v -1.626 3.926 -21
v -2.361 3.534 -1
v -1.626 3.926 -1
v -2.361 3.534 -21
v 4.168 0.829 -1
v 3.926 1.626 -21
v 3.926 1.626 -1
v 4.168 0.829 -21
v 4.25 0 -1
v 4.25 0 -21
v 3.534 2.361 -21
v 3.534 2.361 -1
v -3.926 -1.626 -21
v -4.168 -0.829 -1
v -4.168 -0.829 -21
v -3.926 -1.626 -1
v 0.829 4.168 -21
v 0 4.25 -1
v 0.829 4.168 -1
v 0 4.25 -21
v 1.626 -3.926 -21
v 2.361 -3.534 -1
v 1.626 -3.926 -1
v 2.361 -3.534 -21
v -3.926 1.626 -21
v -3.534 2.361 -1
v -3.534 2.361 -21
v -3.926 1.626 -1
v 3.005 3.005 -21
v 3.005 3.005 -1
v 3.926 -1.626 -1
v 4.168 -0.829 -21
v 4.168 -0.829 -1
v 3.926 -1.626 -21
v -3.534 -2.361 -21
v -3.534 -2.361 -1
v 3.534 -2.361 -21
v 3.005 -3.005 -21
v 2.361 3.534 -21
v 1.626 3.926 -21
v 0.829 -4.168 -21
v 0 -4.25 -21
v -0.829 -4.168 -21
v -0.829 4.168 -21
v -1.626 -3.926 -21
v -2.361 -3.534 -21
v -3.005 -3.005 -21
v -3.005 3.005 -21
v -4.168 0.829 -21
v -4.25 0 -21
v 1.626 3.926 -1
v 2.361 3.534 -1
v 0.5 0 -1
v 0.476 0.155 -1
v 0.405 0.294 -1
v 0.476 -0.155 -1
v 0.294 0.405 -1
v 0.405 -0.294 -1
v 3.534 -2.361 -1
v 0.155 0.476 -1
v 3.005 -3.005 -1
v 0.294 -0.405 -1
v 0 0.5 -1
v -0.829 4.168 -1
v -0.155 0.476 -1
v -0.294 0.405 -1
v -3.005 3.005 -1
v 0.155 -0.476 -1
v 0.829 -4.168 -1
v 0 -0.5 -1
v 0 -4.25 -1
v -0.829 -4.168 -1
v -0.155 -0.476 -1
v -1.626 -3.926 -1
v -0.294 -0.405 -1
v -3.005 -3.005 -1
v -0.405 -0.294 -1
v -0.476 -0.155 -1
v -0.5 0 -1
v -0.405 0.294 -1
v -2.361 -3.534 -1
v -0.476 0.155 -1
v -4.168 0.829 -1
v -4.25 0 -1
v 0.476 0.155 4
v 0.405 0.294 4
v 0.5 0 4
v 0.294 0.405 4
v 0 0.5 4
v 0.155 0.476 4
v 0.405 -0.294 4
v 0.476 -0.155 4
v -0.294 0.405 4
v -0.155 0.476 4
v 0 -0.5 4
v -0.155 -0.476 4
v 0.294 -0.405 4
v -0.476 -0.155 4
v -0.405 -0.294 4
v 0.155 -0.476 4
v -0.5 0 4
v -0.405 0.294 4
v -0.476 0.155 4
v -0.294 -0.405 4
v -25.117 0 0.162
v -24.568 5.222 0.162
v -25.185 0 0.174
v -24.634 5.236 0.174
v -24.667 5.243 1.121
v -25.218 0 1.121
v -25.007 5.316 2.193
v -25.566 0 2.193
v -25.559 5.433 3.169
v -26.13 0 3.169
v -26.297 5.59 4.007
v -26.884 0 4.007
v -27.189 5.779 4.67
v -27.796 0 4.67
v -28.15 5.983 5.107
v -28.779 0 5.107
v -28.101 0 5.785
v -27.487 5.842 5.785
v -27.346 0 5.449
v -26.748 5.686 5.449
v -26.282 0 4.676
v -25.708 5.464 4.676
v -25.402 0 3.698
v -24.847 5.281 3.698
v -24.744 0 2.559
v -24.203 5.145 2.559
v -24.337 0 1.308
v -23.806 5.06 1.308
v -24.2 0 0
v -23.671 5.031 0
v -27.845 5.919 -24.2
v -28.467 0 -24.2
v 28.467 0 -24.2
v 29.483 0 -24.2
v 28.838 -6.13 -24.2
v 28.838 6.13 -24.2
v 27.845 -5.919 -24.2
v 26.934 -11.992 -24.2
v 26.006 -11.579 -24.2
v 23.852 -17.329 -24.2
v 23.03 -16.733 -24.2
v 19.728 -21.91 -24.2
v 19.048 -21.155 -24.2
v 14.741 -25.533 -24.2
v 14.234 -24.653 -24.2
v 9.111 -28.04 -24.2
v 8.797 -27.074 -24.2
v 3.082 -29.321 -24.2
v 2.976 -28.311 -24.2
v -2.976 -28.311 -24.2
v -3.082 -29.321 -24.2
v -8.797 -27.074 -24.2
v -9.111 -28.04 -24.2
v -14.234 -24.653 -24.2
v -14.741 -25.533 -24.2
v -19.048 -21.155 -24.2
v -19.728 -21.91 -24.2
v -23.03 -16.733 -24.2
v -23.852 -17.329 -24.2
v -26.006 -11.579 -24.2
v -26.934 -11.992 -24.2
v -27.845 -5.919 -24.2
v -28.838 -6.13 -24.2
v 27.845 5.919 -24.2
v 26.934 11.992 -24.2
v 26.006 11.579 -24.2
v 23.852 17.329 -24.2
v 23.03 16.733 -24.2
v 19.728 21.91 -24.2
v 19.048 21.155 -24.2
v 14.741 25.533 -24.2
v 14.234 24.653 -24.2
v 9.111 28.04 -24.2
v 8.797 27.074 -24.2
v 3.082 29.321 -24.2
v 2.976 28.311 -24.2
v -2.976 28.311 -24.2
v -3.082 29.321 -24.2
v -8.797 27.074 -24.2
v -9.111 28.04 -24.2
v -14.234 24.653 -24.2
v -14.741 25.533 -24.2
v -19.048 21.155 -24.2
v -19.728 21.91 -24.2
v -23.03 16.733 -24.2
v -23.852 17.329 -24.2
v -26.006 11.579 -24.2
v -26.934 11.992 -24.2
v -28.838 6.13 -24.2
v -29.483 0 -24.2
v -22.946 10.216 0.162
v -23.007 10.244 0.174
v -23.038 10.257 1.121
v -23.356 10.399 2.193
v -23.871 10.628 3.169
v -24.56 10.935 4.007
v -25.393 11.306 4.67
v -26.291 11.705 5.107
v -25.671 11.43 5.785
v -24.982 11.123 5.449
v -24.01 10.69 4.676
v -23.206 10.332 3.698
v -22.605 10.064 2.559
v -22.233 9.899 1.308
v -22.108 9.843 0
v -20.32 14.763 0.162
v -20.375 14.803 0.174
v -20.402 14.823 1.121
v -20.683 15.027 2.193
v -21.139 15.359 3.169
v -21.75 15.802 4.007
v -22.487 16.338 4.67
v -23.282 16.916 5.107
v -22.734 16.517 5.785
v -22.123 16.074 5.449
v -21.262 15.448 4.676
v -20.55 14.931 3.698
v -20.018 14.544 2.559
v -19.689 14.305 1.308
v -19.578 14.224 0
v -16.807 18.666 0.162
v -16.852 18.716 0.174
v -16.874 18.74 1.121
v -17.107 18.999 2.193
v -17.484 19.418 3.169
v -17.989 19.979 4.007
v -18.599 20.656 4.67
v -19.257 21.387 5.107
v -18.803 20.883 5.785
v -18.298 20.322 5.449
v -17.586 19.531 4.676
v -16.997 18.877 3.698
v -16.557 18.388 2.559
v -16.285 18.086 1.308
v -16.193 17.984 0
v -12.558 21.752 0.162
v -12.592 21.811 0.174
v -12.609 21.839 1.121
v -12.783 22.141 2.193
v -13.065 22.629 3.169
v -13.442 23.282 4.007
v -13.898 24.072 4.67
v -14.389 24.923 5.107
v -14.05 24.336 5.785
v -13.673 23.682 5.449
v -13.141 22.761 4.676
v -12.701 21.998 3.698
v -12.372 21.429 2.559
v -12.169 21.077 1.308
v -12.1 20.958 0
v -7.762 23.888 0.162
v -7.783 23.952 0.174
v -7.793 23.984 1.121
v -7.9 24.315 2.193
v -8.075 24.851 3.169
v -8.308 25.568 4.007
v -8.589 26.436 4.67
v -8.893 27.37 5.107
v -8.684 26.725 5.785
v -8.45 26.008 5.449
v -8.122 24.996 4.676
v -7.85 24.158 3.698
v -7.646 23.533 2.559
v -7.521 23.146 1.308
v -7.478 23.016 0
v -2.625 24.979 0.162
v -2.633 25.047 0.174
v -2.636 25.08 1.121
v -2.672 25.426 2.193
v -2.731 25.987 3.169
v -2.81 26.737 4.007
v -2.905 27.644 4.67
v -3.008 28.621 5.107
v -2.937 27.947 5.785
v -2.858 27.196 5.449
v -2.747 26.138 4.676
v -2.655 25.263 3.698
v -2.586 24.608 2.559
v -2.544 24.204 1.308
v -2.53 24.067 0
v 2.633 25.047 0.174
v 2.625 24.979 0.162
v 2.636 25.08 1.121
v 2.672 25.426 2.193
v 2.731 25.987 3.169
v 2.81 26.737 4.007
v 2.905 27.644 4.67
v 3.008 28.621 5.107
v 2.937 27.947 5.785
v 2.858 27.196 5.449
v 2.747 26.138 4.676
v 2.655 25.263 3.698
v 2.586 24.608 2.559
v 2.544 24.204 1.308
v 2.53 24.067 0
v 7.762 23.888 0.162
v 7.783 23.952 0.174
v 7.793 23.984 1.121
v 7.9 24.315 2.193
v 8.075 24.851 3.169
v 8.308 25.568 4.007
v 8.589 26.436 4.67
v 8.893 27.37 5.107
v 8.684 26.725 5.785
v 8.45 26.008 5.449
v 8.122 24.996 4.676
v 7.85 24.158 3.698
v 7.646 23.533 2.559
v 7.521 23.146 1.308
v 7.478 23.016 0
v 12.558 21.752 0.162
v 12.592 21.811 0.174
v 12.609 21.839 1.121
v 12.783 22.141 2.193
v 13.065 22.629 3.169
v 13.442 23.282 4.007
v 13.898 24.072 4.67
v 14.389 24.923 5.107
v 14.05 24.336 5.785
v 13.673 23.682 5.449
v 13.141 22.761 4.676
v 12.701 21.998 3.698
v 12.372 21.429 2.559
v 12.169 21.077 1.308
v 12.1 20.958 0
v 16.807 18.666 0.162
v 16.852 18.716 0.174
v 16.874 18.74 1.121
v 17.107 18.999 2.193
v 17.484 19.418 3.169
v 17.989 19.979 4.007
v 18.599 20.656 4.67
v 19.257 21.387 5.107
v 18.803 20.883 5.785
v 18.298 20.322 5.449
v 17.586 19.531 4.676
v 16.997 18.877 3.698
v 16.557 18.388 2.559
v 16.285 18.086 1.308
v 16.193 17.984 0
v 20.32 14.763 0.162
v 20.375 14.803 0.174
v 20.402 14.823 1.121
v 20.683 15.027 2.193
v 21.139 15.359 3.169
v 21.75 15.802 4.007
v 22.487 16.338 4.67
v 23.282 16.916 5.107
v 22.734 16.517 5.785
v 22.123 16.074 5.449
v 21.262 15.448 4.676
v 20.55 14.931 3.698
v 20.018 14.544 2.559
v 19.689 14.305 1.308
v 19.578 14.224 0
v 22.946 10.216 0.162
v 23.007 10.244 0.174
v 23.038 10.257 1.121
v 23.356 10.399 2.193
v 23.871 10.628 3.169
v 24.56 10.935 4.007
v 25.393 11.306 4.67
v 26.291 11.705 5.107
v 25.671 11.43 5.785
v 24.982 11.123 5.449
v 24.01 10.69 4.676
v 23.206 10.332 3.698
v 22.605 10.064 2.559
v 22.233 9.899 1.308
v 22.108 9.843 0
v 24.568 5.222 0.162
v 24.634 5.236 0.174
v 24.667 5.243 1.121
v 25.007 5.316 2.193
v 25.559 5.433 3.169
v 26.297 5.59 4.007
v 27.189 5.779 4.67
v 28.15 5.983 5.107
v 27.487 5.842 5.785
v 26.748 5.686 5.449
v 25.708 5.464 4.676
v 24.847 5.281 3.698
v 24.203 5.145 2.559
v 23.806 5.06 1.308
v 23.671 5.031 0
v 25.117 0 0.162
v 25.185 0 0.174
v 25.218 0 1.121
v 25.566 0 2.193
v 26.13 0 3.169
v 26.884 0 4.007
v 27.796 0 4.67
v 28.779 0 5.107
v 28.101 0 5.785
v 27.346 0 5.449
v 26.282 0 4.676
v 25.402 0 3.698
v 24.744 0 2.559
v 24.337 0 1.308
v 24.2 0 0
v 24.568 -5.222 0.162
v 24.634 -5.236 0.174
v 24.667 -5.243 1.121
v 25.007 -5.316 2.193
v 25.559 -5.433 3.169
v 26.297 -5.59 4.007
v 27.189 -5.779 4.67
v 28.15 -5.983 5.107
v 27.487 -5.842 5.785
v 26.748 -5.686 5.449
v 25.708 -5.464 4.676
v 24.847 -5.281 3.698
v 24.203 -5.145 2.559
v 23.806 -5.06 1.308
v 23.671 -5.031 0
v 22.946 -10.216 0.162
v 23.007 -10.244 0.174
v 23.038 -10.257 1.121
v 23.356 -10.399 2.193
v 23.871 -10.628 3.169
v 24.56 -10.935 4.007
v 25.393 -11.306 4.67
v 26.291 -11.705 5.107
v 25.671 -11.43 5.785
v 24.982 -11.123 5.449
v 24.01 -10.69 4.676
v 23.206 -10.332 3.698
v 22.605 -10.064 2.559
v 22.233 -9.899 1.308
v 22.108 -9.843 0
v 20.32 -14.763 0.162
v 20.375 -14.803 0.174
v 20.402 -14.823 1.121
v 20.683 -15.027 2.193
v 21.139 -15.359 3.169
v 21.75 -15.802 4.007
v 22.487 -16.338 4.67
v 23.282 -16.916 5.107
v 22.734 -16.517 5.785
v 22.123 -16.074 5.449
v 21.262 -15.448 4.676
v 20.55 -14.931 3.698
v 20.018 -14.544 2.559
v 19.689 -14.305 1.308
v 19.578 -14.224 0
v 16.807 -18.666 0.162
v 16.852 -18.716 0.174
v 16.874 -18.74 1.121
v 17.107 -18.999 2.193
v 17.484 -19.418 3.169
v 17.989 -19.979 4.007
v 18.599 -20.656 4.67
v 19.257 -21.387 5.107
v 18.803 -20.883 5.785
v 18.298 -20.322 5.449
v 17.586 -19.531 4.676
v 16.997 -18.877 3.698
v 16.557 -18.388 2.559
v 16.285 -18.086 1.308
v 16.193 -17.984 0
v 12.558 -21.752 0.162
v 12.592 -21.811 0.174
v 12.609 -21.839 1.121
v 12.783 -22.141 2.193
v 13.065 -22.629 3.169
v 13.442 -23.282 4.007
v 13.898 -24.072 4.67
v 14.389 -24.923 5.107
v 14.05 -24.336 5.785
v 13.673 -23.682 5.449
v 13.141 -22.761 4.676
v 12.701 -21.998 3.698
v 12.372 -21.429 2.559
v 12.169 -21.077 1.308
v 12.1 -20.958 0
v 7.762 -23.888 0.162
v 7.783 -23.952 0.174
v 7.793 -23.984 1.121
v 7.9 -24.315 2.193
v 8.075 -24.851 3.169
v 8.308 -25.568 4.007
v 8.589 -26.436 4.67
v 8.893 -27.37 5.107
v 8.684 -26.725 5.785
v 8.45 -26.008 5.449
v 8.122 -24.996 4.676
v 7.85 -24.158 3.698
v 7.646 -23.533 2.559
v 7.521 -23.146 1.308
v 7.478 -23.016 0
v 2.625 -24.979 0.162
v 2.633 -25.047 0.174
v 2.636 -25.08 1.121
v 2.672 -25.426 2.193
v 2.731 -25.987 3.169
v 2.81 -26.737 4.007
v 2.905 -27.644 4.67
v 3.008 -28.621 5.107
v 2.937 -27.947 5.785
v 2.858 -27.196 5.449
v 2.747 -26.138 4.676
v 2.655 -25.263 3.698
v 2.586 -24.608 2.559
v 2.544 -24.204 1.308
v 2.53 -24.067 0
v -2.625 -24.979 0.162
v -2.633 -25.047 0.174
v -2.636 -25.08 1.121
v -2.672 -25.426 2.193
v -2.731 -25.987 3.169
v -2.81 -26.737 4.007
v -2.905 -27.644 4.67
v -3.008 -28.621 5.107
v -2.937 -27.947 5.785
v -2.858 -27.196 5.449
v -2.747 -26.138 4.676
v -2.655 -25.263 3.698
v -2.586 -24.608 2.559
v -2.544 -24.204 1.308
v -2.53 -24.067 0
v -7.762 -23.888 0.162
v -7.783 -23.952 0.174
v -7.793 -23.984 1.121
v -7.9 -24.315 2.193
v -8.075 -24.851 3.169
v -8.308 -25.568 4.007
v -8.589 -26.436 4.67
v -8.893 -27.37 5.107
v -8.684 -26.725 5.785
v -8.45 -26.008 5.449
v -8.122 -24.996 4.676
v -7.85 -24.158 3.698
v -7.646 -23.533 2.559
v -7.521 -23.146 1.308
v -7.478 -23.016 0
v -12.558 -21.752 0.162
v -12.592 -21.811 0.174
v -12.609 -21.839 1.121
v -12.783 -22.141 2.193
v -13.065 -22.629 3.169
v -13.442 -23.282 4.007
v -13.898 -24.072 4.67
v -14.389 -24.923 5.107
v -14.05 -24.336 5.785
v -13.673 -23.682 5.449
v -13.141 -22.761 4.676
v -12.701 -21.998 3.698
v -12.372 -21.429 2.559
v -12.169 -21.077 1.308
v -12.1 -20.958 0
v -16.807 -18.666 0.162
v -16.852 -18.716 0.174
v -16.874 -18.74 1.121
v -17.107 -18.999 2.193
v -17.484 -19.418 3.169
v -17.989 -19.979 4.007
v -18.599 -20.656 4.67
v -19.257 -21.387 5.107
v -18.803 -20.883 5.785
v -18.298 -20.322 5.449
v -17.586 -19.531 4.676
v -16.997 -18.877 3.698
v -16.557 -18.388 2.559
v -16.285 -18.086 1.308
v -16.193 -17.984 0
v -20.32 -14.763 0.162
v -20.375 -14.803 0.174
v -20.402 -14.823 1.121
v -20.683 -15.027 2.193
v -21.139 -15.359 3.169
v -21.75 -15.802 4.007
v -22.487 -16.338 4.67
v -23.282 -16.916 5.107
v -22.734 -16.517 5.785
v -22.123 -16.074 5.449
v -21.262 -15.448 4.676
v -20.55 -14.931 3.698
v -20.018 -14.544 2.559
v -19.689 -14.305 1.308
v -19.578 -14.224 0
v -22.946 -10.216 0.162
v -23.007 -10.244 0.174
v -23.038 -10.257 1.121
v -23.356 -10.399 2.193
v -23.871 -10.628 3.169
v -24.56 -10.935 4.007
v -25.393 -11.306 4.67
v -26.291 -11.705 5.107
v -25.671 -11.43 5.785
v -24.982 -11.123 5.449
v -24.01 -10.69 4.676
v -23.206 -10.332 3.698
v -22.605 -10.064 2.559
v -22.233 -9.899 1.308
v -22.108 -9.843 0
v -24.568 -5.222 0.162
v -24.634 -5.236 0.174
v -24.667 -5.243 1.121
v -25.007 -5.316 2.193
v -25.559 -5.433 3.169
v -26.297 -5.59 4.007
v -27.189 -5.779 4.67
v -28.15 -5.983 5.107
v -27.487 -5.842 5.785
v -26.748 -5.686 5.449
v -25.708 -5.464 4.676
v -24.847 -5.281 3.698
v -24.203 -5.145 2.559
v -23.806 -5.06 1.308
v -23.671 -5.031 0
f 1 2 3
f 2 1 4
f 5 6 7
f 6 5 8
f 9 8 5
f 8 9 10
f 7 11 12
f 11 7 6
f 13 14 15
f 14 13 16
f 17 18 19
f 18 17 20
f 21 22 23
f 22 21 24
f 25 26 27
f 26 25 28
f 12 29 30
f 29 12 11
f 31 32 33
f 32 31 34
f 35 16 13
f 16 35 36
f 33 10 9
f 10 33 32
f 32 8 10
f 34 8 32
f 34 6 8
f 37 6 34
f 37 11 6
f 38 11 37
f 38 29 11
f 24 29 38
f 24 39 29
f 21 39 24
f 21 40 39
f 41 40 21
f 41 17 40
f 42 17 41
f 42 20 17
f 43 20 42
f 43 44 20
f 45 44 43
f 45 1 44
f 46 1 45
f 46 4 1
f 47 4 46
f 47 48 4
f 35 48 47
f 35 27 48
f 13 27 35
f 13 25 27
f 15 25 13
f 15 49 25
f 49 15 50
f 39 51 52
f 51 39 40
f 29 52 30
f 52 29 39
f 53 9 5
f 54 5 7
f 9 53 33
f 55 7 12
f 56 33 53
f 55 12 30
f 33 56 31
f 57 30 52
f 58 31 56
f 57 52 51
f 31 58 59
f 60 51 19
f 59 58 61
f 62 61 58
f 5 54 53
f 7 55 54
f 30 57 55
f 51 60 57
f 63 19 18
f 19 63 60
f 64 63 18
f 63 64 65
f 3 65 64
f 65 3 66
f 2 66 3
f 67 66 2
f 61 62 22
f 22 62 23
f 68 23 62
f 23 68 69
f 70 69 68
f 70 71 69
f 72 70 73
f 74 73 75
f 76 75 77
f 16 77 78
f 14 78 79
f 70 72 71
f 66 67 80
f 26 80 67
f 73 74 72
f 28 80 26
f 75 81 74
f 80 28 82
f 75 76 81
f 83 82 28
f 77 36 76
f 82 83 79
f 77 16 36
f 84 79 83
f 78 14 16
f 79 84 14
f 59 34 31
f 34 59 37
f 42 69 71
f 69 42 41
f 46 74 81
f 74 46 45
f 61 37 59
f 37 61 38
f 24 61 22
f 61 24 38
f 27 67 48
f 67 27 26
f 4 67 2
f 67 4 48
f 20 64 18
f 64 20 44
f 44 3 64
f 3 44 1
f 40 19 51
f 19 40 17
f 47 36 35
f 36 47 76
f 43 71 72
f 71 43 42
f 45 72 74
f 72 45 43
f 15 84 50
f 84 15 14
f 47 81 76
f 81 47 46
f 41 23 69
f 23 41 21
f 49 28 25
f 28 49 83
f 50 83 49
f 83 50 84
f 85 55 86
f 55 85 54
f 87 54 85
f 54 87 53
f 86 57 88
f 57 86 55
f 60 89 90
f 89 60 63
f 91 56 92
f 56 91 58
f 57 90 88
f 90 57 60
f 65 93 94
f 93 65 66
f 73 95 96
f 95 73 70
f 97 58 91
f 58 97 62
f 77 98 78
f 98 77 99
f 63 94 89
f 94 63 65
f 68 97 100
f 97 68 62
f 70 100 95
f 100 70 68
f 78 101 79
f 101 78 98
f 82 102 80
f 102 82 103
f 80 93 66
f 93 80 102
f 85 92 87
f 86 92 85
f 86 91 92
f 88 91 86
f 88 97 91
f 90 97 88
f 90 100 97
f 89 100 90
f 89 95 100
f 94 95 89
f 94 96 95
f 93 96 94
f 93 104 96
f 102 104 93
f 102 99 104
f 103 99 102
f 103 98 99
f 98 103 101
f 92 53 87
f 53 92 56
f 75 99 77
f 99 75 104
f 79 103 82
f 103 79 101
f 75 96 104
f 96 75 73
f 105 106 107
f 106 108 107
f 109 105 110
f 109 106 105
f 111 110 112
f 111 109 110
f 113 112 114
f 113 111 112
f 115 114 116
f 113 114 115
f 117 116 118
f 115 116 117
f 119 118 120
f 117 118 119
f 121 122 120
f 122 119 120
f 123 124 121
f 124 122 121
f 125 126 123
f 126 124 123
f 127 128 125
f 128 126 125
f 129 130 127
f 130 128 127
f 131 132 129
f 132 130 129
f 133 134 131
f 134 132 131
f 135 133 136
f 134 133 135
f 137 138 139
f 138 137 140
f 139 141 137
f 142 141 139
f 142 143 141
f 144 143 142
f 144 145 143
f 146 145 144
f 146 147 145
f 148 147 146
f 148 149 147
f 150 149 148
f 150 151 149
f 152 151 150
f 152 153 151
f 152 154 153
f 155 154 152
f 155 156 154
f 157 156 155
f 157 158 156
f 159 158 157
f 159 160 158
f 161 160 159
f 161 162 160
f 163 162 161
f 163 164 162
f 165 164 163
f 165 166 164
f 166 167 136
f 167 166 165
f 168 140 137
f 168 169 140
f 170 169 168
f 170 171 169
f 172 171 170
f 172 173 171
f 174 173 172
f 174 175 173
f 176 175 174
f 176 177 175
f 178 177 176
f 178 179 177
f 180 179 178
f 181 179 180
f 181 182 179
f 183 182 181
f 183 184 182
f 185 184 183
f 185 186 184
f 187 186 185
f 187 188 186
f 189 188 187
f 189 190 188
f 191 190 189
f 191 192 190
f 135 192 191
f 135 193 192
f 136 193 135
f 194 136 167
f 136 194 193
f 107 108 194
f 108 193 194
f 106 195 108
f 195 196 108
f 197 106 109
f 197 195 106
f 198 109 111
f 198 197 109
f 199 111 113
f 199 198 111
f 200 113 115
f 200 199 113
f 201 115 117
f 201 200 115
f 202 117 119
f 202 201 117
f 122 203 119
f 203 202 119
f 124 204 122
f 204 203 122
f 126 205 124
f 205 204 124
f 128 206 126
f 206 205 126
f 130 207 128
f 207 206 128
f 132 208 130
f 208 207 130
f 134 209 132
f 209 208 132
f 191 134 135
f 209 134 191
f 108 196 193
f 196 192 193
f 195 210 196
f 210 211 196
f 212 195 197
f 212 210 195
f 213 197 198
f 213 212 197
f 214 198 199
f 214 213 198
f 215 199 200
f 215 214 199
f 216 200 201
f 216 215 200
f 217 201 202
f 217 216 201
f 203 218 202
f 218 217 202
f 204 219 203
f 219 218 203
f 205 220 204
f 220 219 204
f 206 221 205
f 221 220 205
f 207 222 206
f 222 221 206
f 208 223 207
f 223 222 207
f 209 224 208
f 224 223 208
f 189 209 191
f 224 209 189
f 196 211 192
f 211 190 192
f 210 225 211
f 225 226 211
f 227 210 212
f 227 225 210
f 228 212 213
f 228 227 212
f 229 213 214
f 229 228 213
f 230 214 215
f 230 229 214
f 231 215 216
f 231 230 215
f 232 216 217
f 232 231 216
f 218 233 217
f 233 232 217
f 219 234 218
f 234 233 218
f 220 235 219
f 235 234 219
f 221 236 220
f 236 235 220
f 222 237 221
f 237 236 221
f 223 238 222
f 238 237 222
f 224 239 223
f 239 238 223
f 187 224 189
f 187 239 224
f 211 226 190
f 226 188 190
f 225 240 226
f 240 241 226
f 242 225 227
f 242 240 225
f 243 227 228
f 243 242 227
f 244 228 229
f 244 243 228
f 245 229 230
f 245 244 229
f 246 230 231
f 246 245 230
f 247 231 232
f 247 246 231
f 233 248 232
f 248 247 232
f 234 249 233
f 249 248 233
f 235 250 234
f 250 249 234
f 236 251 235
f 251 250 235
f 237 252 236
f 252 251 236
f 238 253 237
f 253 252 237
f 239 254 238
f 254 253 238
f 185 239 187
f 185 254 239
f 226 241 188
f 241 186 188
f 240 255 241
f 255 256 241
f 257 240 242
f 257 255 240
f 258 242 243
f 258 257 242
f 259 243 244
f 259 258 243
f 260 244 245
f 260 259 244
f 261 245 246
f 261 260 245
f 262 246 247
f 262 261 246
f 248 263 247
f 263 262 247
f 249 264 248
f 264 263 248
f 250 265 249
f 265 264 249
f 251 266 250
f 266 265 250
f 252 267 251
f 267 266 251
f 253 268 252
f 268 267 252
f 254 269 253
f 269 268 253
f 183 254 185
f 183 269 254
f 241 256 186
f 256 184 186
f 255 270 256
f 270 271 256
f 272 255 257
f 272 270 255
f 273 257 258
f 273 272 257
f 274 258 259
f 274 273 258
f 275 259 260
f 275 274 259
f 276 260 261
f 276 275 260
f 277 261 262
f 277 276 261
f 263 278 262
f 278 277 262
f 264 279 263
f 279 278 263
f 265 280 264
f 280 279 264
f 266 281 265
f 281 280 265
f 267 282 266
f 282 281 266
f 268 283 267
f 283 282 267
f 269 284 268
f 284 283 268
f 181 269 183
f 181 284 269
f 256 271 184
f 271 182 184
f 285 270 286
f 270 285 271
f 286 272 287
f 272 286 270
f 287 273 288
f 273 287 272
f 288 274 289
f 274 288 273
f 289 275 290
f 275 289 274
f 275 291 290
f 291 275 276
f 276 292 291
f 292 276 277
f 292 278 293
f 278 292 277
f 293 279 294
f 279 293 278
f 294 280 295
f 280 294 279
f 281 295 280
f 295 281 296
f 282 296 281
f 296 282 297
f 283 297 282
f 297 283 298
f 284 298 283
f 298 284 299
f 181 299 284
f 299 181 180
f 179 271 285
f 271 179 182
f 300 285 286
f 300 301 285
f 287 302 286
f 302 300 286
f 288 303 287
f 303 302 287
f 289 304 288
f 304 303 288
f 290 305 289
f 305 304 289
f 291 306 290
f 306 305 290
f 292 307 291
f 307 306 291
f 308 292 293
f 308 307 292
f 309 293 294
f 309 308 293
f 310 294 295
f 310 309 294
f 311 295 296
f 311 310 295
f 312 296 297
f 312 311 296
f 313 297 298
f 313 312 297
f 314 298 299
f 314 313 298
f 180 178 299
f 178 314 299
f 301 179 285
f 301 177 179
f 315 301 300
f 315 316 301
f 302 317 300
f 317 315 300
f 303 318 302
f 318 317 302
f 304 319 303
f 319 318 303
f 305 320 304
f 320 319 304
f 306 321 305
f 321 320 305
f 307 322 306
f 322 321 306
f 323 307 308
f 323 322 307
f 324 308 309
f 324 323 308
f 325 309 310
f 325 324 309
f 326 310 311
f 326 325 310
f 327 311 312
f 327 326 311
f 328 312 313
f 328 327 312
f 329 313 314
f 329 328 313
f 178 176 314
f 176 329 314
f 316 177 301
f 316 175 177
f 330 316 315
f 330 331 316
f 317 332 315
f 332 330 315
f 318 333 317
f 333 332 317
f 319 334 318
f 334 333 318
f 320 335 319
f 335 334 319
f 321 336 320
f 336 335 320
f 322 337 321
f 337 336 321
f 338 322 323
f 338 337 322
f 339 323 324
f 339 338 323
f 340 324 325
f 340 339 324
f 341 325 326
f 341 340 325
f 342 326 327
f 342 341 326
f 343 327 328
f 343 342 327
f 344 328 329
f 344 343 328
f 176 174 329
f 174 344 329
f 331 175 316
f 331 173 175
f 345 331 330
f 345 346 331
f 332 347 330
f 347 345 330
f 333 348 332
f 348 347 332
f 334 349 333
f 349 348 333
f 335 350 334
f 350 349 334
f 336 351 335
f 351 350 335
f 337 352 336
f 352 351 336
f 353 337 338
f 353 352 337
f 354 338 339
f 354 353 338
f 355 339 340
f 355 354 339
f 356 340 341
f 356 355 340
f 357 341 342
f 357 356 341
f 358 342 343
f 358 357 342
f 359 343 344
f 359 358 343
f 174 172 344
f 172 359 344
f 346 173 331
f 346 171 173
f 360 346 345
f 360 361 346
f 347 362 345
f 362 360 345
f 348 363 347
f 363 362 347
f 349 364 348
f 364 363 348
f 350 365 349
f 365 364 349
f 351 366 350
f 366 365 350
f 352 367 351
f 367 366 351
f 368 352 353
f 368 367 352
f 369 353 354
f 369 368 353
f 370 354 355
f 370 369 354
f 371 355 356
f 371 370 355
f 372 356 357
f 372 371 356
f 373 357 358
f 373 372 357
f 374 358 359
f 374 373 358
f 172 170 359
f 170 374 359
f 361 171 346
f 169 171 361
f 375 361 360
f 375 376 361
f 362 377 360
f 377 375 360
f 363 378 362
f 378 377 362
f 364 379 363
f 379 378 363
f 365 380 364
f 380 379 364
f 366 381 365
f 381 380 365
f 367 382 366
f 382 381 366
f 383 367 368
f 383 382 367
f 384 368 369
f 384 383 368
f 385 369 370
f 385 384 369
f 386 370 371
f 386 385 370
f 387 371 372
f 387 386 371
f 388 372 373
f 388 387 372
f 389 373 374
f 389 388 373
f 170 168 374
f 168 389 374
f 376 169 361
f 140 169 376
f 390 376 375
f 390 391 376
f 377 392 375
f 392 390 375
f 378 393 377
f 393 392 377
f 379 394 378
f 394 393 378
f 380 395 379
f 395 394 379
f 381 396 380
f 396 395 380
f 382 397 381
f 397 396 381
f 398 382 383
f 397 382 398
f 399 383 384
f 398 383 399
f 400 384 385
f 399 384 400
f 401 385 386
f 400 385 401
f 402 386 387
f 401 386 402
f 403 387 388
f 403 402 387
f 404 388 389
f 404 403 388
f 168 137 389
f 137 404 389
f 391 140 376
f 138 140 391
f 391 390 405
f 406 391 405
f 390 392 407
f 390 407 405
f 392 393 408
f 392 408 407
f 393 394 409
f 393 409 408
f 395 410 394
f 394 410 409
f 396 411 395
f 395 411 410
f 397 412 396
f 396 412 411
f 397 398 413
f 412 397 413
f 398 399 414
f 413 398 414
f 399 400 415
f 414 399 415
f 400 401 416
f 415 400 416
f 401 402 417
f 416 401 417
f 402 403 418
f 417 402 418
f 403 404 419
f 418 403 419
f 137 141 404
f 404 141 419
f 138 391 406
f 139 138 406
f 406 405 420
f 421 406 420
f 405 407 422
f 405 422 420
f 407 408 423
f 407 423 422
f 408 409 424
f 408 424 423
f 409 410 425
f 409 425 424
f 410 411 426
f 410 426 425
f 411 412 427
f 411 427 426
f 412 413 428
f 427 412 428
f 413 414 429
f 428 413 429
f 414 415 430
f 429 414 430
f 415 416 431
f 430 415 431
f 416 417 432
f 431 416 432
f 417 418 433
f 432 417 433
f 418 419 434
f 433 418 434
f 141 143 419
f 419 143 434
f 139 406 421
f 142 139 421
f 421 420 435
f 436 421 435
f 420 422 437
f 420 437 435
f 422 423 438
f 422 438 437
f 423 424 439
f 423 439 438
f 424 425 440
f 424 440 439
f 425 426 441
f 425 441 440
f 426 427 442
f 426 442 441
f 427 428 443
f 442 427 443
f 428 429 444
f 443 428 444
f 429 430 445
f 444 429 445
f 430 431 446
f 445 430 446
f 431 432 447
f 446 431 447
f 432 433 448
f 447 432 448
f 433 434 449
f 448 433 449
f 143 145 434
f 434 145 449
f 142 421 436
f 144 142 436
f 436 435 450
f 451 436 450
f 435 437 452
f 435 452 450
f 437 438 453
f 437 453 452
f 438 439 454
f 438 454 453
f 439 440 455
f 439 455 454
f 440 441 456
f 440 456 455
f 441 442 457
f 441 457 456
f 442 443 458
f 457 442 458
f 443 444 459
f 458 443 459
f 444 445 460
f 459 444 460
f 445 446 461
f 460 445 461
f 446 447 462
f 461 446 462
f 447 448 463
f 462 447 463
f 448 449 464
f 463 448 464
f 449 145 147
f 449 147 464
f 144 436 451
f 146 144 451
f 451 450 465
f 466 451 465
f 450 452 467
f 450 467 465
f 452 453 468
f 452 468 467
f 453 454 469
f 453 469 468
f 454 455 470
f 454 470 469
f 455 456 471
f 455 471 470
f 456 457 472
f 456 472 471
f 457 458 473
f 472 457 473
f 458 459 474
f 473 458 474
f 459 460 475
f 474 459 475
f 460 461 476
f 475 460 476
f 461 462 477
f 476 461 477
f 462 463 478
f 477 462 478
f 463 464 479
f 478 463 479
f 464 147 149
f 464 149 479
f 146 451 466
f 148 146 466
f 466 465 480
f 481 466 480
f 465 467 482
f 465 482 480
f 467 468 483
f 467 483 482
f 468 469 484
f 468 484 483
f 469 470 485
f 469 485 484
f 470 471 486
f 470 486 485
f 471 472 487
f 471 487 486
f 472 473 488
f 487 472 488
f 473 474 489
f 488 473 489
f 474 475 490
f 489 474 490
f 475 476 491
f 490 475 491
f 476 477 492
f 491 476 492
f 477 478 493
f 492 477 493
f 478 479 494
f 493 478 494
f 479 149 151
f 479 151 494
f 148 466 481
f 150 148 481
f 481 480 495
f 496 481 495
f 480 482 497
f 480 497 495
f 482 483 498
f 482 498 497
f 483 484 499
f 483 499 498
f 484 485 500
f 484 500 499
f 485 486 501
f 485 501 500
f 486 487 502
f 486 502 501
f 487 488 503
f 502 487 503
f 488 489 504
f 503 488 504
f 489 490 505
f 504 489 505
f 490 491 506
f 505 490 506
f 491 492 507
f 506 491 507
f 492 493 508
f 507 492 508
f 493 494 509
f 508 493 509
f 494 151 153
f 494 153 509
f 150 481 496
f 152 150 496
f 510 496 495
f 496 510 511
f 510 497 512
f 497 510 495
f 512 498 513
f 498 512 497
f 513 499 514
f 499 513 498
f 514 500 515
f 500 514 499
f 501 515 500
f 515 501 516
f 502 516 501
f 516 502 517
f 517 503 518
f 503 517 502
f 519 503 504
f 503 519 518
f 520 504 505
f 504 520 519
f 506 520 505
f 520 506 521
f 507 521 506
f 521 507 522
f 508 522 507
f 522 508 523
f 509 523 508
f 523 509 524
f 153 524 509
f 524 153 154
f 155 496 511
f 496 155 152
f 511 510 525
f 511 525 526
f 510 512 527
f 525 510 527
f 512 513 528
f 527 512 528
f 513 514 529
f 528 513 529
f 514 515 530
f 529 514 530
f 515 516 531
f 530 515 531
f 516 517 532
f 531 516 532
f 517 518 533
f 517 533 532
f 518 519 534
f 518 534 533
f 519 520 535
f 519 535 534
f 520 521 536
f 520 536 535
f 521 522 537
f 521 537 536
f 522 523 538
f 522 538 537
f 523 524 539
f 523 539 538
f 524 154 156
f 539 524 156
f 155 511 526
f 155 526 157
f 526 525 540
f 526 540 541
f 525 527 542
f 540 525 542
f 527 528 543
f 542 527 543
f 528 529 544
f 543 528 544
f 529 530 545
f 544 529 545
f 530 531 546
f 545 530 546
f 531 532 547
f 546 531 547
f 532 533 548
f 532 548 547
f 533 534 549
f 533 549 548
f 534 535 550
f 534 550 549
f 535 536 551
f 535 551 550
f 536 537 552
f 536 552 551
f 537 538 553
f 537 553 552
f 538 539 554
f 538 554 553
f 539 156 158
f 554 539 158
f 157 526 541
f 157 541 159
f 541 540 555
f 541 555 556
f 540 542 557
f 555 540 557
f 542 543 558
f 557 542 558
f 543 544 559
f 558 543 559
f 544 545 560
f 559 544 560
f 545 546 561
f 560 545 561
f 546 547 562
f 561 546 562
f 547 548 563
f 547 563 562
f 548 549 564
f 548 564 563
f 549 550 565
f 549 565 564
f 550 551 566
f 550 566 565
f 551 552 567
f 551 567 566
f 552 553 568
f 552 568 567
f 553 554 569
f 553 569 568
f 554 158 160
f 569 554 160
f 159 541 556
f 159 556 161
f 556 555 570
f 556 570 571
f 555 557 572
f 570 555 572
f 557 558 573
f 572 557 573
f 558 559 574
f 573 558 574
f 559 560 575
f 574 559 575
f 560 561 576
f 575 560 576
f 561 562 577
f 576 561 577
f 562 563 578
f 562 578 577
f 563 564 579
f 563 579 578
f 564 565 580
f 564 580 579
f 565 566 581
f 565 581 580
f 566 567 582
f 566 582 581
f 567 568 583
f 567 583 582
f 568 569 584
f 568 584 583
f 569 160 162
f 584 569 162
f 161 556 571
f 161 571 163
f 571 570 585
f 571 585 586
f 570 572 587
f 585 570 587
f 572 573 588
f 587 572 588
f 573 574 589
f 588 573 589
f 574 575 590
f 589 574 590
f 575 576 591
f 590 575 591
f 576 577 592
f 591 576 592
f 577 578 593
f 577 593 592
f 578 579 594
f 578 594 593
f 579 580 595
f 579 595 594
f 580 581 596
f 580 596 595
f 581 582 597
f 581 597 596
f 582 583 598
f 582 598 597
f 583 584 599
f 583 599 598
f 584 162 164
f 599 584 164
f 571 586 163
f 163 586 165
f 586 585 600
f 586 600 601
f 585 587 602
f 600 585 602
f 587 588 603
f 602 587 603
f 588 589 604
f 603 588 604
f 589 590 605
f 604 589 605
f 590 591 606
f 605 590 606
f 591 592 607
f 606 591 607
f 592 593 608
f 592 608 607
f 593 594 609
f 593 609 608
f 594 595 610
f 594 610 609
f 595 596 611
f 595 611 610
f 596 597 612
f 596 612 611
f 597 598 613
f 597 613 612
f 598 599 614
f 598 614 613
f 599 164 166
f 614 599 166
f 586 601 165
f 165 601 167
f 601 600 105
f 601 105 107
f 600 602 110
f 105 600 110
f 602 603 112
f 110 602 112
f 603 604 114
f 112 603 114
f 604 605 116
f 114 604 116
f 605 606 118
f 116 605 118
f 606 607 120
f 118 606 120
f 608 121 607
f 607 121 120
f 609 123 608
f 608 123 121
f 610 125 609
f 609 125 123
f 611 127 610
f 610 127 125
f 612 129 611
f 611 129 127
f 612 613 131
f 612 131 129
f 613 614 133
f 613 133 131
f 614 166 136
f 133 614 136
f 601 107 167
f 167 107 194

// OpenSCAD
/*
Configurable Ducting System for a Quadcopter

    According to the study below (and Richards work) the optimal optimal configuration found experimentally includes a δtip = 0.1%Dt,  rlip = 13%Dt, θd = 10◦ and Ld = 50% to 72%Dt.

    A Quick(ish) Key:
        prop_dia_upper:
            Longest Part of the Propellor.
            IDEAL: Whatever your prop measures.
        prop_spacing:
            The extra space that is added to both sides of the prop_dia_upper variable to give the inside wall of the duct.
            IDEAL: 0.1% of the dia_total, BUT you probably want more tolerance if you're printing/using cheaper props. I've left this as a millimeter value though, not a percentage so that you can define set tolerance.
        dia_total:
            Combines the variables as described above.
            IDEAL: N/A - don't change this unless you're really ripping things to pieces.
        lip_radius_pc:
            Affects the radius of the top curve of the duct, percentage based on the dia_total variable.
            IDEAL: 13%
        shroud_lower_length_pc:
            Affects the length of the duct section, based on the dia_total variable.
            IDEAL: 50 - 70%
        duct_angle:
            The angle off of vertical (Z) by which the inner duct wall pushes outwards.
            IDEAL: 10 degrees
        duct_resolution:
            Affects overall number of slices (the smoothness or quality of the end STL).
            IDEAL: 120. Higher is better, but will take ages if you go too high.

    NOTE ON REDUCING WEIGHT:
        I have a way of reducing weight -- look for the 'slice_extruded' module and replace the 'slice_final' with 'slice_final_hollow' - but be warned, you need to check that the placement doesn't leave you with overly thin walls as it does not always scale well with changes to certain variables. 
        
        You'll want to work with the translate and scale functions to find a good balance for your needs. 
        
        Comment out the 'slice_extruded' and call 'slice_final_hollow' - this will give you a cross section so that you can see what's going on and reduce render times to almost nothing. 


*References: 
    Based on the following sources by the following:
                https://capolight.wordpress.com/2015/01/14/quadcopter-rotor-duct/
        - Richard.
    
    HOVER AND WIND-TUNNEL TESTING OF SHROUDED ROTORS FOR IMPROVED MICRO AIR VEHICLE DESIGN
        - Jason L. Pereira Doctor of Philosophy, 2008.

    Design by Harlo,
    02/05/2016.

*/


///USER Variables START

//Propellor Diameter
prop_dia_upper = 46; //[30:0.5:500]
//Spacing between Duct and Prop
prop_spacing = 1.2;//1.5; //[0.1:0.1:10]
dia_total = prop_dia_upper + (prop_spacing*2);
//Lip Radius Percentage
lip_radius_pc = 0.13; //[0.05:0.01:0.30]

//Length Percentage (Lower Z Height)
shroud_lower_length_pc = 0.50; //[0.10:0.01:0.80]
//Duct Angle (degrees)
duct_angle = 10; //[5:0.5:45]
//Resolution of Duct (> = smoother)
duct_resolution = 30;//[30:1:360]

///USER Variables END

//Internal/Calculated Variables
lip_dia = (dia_total * lip_radius_pc)*2;///We double for diameter to keep things "simple".
shroud_lower_length = shroud_lower_length_pc * dia_total;


//Output of Calculated Variables to User
echo ("Shroud Lower Height = ", shroud_lower_length); //does not include the curved diameter
echo ("Shroud Total Height = ", shroud_lower_length + lip_dia/2);
echo ("Lip Diameter = ", lip_dia); //OUTPUT
echo ("Duct_angle = ", duct_angle);


///RENDER


slice_extruded_hollow();
//slice_extruded_middle();

/*
//For Later Testing - based on the rough dimensions of an emax motor
translate([0,0,-12]){
    motor(16.5, 28, 6, 5);
}
*/

/*
//FOR TESTING DIMENSIONS

difference(){
    slice_extruded();
    rotate([90,0,0]){
        cylinder(h = 300, d = 8, center = true, $fn = 20);
    }   
}

cylinder (h = 1, d = prop_dia_upper, $fn = 32, center = true);
*/



/*
MAIN BUILD MODULES FOR THE SHROUD/DUCT
*/

module slice_extruded_hollow($fn = duct_resolution){
    rotate_extrude(convexity = 10){
        translate([dia_total/2,0,0]){
            slice_final();
        }
    }


//	translate([150, 0, 0]) {
//		slice_final();
//		translate([10, 0, 0]) slice_leading_edge();
//		translate([10, -5, 0]) slice_lower_duct();
//	}

	module slice_final(){
	   
	        slice_leading_edge();
	        slice_lower_duct();
	   
	}
	
	module slice_lower_duct(){
	    difference() {
	    	union() {
		    translate([lip_dia-1/2,-shroud_lower_length/2,0]){
		       //square([1,shroud_lower_length], center = true);
		    }
	    	rotate([0, 0, duct_angle]) translate([0,-shroud_lower_length-2,0]) square([1,shroud_lower_length+2], center = false);
	    	
	    	}
	        translate([lip_dia/2,-shroud_lower_length-5,0]){
	            	square([lip_dia+2,10], center = true);
	        }
	    
	    }
	    
	    
	}
	
	module slice_leading_edge(){
	    translate([lip_dia/2,0,0])
	    {
	    	difference(){    
	            //upper edge
	            circle(d = lip_dia, center = true);
	        
	        	translate([0,-lip_dia/2,0]){
	            	square(lip_dia, center = true);
	        	}
	        	translate([lip_dia/2, 6, 2]){
	            	rotate([0, 0, 45]) square(lip_dia, center = true);
	        	}
	         	circle(d = lip_dia-1.8, center = true);
	         
	         }
	        
	    }
	}
}


module slice_extruded_middle($fn=duct_resolution){
    rotate_extrude(convexity = 10)
    {
    	difference() 
    	{
    		//cube([dia_total/2,])
    		//circle(d=dia_total)
    		total_heigth=shroud_lower_length + lip_dia/2;
    		translate([0,lip_dia/2-total_heigth,0]) square(size = [dia_total/2+5, total_heigth], center = false);
	        translate([dia_total/2+0.05,-0.05]) {
        	    slice_final();
    	    }
        
        }
    }

	translate([150, 0, 0]) {
		//#slice_final();
		//translate([60, 5, 0]) slice_leading_edge();
		//translate([60, -5, 0]) slice_lower_duct();
	}
	


	module slice_final(){
	   
	        slice_leading_edge();
	        slice_lower_duct();
	   
	}
	
	module slice_lower_duct(){
	    //angles
	    remain_angle = 180 - 90 - duct_angle;
	    
	    lower_length = (sin(duct_angle))/(sin(remain_angle)/shroud_lower_length);
	    
	    //sinA/a = sinB/b = sinC/c
	    //sin(remain_angle)/shroud_lower_length = sin(15 degress)/?
	    //solving for the lower length of the triangle (x length)
	    
	    difference(){
	    //Base cube for being cut from.
	    translate([lip_dia/2,-shroud_lower_length/2,0]){
	        square([lip_dia,shroud_lower_length], center = true);
	    }
	    
	    //Cutting Triangle
	        triangle_points = [[0,0], [0,-shroud_lower_length], [ lower_length, -shroud_lower_length]]; //TEST SO FAR
	        polygon(triangle_points);
	    }
	}
	
	module slice_leading_edge(){
	    difference(){    
	        translate([lip_dia/2,0,0])
	        {
	            //upper edge
	            circle(d = lip_dia, center = true);
	        }
	        translate([lip_dia/2,-lip_dia/2,0]){
	            square(lip_dia, center = true);
	        }
	        
	    }
	    
	}
	
}

/*
Motor representation -- rough
    - maybe clean up to use as a library module
*/



module motorx(body_height, body_dia, shaft_height, shaft_dia){
    total_height = body_height + shaft_height;
    echo("Motor Total Height = ", total_height);
    
    translate([0,0,0]){
        cylinder (h = body_height, d = body_dia, $fn = 32, center = true);
        }
    
    translate([0,0,body_height/2 + shaft_height/2]){
        cylinder (h = shaft_height, d = shaft_dia, center = true, $fn = 20);
    
        }
        
    translate([0,0,0]){
        
    }
    
}

 translate([0, 0, -11]) motorx(20, 8.5, 5, 1);
 translate([0, 0, 0]) color("yellow", 0.1) circle(d=55, center=true);


////David Harlock, 02/05/2016.
